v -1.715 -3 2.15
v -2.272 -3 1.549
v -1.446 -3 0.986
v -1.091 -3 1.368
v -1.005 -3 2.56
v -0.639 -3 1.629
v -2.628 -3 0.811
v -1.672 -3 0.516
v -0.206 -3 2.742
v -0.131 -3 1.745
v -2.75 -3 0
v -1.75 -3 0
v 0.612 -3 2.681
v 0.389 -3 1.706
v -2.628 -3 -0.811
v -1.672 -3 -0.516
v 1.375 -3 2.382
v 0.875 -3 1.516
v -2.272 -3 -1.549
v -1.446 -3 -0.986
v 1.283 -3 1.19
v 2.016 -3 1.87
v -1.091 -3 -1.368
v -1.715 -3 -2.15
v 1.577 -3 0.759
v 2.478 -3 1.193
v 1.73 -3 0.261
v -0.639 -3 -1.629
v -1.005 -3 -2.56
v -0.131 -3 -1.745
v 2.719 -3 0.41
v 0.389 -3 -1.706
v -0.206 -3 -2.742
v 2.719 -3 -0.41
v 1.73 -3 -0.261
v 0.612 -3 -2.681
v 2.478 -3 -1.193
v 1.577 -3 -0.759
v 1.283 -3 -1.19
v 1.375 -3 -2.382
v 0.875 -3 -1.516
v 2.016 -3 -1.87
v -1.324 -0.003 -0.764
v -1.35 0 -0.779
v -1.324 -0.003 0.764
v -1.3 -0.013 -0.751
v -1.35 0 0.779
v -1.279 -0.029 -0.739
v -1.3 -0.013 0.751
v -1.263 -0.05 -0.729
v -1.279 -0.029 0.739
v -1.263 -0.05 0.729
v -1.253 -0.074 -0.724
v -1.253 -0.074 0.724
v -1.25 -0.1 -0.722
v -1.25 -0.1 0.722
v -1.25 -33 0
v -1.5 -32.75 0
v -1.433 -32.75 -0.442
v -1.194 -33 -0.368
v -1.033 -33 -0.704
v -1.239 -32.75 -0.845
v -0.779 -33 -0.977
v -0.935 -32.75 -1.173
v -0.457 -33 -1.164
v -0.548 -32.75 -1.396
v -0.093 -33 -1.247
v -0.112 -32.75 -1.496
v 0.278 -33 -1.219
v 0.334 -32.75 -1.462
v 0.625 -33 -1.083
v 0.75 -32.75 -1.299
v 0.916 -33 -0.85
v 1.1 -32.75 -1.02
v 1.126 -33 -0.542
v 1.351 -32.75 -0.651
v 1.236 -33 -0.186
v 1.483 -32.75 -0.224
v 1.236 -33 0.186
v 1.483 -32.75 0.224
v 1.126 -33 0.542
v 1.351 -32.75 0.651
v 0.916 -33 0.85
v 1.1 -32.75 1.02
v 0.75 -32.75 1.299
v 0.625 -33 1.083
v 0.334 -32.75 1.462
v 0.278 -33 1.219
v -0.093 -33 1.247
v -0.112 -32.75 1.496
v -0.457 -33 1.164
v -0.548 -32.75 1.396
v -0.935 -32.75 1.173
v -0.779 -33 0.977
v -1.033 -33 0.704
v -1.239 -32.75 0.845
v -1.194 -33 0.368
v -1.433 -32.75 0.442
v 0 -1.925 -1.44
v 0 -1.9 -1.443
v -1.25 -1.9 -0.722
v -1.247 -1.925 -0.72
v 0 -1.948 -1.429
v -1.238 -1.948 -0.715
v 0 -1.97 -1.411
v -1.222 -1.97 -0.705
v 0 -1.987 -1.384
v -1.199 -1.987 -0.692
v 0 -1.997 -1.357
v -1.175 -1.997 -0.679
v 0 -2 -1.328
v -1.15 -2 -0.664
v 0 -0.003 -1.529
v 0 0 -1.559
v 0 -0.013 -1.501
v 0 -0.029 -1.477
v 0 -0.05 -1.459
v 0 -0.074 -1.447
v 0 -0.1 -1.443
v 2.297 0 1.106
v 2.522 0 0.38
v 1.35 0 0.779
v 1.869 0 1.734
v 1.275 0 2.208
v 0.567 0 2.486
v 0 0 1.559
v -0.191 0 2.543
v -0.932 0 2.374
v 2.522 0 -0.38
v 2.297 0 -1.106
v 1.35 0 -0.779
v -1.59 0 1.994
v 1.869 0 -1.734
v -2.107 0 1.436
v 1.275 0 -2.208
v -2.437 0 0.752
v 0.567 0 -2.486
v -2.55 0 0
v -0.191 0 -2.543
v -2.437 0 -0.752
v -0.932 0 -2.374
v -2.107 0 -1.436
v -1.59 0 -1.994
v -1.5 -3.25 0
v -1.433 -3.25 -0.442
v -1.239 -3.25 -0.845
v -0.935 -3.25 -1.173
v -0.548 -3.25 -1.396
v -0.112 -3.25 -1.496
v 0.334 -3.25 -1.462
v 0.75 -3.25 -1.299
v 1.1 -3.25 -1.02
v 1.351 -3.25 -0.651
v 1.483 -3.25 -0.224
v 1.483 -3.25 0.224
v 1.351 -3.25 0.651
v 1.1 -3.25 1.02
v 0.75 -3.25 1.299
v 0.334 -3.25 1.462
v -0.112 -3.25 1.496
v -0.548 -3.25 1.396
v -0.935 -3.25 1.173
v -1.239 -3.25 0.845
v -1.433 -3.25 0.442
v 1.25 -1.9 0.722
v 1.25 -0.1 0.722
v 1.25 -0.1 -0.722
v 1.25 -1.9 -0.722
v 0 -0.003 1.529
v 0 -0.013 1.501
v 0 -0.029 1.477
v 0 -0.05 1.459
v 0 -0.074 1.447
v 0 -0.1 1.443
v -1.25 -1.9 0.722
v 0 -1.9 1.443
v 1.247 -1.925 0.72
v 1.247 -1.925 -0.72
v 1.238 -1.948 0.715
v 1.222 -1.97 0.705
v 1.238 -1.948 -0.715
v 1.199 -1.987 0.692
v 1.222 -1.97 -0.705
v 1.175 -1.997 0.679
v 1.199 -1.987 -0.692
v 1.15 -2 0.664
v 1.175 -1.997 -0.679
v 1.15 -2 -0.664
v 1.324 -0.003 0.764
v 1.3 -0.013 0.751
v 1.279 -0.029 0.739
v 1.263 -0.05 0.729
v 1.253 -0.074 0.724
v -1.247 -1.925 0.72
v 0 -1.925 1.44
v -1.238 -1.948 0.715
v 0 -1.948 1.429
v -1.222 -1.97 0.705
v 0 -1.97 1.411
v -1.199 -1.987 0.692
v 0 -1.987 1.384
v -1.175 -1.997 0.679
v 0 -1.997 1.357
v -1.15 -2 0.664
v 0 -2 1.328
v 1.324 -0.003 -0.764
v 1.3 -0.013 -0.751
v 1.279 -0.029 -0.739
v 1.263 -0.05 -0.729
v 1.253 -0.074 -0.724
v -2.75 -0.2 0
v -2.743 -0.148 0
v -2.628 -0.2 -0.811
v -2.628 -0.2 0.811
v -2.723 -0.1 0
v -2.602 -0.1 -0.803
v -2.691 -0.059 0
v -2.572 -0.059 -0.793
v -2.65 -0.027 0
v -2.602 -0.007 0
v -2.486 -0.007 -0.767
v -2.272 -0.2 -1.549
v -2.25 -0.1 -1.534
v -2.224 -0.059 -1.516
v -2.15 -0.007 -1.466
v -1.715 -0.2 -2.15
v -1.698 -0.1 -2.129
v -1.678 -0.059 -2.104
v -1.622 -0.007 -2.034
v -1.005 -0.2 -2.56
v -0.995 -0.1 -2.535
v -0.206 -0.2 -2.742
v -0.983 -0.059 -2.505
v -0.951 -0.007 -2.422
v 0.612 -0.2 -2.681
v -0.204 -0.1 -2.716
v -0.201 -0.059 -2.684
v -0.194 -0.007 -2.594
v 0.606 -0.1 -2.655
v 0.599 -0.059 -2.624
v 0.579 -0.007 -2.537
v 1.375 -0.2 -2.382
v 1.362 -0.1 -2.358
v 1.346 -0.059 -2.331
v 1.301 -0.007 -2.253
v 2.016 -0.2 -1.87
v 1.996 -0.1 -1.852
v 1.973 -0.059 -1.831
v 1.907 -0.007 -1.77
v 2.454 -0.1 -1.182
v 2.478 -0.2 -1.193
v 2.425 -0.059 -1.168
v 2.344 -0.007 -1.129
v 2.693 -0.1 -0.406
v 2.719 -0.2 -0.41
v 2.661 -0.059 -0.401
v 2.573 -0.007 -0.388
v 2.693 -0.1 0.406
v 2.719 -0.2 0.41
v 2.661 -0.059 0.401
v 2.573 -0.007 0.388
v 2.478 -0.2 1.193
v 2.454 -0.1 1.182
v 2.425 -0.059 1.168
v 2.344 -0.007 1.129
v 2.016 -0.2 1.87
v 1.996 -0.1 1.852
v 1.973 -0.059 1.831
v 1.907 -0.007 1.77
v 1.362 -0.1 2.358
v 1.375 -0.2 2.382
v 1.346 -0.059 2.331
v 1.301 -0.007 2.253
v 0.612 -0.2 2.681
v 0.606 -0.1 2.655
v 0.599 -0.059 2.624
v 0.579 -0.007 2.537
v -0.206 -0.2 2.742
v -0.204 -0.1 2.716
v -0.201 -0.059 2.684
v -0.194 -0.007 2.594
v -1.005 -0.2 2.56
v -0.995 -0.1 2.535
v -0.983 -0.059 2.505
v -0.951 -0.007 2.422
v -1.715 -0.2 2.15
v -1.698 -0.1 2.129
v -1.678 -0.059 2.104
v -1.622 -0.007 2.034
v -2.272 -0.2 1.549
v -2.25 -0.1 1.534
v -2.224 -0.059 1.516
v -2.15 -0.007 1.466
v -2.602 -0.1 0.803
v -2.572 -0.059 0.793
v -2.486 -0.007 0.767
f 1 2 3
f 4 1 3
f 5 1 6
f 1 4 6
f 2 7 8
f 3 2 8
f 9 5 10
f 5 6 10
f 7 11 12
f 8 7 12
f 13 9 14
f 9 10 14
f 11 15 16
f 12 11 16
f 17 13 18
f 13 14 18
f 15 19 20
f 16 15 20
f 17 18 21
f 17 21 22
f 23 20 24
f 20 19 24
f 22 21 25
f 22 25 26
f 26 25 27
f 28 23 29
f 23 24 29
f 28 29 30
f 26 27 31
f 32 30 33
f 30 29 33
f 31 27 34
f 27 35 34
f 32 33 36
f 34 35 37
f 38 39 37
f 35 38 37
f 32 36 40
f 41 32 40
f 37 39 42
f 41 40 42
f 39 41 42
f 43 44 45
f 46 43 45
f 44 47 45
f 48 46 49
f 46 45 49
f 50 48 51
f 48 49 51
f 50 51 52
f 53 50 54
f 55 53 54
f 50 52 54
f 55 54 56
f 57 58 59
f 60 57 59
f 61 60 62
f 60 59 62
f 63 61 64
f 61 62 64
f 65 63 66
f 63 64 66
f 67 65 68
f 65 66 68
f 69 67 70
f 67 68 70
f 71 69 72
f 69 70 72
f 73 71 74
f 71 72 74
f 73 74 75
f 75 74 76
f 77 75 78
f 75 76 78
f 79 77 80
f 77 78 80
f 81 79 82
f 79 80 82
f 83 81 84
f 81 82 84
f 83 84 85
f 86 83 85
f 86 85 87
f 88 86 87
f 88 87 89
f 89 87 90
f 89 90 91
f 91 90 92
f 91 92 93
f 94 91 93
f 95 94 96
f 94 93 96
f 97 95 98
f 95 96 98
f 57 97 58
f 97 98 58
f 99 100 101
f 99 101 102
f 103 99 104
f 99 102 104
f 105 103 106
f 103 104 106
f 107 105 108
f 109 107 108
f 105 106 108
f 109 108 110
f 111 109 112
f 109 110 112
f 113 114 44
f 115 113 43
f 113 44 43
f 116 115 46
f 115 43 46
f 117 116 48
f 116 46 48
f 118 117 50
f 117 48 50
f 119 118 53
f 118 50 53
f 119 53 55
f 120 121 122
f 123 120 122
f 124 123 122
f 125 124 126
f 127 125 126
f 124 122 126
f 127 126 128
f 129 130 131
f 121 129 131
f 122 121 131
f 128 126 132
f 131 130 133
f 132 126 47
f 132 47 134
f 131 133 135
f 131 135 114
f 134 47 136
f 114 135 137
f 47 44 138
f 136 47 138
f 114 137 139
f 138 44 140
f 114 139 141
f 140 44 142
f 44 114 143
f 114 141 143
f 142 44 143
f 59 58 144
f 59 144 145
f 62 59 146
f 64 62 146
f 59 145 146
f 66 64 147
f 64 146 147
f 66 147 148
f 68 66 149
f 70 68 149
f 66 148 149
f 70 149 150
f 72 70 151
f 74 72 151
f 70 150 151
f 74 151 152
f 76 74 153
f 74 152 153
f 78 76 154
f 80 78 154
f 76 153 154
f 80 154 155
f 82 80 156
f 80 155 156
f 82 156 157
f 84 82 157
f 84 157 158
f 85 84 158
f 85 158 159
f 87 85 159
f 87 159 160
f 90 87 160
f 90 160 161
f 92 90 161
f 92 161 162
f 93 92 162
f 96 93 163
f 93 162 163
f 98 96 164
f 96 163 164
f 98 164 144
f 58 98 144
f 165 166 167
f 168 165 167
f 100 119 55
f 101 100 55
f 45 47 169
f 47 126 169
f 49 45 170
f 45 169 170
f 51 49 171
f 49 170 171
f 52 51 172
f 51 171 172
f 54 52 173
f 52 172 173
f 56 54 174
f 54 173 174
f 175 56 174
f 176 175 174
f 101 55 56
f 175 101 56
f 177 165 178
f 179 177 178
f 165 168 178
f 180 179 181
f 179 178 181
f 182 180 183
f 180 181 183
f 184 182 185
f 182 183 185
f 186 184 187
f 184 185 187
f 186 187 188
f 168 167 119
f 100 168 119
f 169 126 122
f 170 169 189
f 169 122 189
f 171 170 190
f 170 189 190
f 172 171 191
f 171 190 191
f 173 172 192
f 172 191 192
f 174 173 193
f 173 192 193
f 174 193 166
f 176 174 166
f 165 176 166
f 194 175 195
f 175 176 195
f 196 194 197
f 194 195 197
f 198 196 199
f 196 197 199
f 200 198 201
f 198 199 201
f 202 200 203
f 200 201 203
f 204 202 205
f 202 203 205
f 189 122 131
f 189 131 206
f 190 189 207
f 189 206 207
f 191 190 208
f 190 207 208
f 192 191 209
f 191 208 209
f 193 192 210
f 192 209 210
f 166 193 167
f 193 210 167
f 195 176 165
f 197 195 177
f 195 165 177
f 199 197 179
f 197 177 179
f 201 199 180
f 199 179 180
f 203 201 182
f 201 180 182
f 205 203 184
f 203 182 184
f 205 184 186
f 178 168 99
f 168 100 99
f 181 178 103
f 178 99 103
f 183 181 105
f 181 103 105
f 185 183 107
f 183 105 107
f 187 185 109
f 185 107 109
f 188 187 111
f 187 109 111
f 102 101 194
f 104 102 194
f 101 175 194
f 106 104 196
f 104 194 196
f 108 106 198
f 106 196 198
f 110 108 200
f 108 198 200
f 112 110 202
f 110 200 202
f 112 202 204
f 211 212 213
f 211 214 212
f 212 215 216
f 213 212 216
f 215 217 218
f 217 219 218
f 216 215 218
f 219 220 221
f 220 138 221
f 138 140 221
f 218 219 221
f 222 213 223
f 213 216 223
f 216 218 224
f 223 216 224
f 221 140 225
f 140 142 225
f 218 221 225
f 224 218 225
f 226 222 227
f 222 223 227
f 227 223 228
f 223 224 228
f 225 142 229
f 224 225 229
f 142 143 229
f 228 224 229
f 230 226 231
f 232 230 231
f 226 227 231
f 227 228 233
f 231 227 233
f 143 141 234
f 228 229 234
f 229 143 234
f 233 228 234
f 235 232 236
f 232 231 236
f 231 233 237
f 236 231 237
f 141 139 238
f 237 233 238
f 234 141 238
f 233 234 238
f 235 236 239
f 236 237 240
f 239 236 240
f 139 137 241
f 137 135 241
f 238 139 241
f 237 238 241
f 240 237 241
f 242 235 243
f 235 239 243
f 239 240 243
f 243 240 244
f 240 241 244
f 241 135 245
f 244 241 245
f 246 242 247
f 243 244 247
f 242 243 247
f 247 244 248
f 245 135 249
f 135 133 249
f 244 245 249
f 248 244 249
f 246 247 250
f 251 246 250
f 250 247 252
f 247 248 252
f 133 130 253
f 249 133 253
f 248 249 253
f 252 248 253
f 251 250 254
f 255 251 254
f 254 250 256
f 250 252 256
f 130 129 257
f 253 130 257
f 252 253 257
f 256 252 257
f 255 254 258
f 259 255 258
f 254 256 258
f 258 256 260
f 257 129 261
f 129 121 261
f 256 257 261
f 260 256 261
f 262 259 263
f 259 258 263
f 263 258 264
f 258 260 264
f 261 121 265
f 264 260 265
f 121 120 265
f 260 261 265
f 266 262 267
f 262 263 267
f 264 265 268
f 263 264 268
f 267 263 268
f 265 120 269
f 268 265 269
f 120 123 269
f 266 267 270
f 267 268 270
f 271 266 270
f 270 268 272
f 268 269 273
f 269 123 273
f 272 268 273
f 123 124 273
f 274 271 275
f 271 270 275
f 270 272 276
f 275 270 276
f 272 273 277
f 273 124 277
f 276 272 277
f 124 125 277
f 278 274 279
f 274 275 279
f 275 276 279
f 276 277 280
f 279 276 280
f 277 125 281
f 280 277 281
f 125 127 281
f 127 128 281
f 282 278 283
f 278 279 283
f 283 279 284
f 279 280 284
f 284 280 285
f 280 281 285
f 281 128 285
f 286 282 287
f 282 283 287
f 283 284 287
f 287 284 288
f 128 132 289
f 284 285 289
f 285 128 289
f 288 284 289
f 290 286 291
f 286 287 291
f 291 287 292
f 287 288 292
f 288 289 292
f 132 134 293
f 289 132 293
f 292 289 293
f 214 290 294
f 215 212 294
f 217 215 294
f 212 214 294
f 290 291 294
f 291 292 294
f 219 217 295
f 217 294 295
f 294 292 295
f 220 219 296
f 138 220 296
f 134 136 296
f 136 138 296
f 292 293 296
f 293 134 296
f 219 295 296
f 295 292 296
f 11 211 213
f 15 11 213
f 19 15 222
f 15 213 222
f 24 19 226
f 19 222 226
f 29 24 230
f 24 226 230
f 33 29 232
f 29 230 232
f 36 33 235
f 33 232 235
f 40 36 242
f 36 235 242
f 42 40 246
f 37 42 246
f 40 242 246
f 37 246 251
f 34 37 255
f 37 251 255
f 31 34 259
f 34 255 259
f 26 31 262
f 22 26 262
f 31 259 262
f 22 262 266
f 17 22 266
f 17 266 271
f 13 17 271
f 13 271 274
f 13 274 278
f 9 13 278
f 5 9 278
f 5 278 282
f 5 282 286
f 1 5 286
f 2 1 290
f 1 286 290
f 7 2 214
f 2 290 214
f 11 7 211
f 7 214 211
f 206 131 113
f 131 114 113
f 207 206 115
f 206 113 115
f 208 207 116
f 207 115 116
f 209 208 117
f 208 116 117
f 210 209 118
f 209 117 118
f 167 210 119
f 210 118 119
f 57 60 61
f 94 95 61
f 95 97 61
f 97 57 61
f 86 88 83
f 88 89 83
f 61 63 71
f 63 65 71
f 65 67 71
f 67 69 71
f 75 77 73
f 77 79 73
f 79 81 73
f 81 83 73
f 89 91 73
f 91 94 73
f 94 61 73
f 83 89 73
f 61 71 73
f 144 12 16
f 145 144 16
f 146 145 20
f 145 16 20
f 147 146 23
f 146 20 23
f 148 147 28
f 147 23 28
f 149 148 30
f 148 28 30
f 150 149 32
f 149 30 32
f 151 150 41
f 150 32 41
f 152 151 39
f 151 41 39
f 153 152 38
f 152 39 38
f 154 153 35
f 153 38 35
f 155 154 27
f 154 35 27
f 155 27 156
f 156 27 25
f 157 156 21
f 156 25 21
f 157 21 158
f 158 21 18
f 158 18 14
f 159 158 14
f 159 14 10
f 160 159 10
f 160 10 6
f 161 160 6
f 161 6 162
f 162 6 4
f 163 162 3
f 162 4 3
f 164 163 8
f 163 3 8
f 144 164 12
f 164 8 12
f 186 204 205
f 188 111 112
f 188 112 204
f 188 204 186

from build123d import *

# Parameters (mm, degrees)
CHAMFER1_SIZE      = 0.25
FILLET1_R          = 0.2
CUT_EXTRUDE1_DEPTH = 2
FILLET2_R          = 0.1


with BuildPart() as part:
    # Sketch1 → Revolve1 (revolve)
    with BuildSketch(Plane.XY):
        Polygon((0, -33), (-1.5, -33), (-1.5, -3), (-2.75, -3), (-2.75, 0), (0, 0), align=None)
    revolve(axis=Axis((0, 0, 0), (0, -1, 0)))

    # Chamfer1
    chamfer1_edges = [part.edges().sort_by_distance(p)[0] for p in [
        (1.5, -3, 0),
        (1.5, -33, 0),
    ]]
    chamfer(chamfer1_edges, length=CHAMFER1_SIZE)

    # Fillet1
    fillet1_edges = [part.edges().sort_by_distance(p)[0] for p in [
        (2.75, 0, 0),
    ]]
    fillet(fillet1_edges, radius=FILLET1_R)

    # Sketch2 → Cut-Extrude1 (cut)
    with BuildSketch(Plane(origin=(0, 0, 0), x_dir=(1, 0, 0), z_dir=(0, 1, 0))):
        Polygon((0, 1.443375673), (-1.25, 0.721687836), (-1.25, -0.721687836), (0, -1.443375673), (1.25, -0.721687836), (1.25, 0.721687836), align=None)
    extrude(amount=-CUT_EXTRUDE1_DEPTH, mode=Mode.SUBTRACT)

    # Fillet2
    fillet2_edges = [part.edges().sort_by_distance(p)[0] for p in [
        (0.625, -2, -1.082531755),
        (1.25, -2, 0),
        (0.625, -2, 1.082531755),
        (-0.625, -2, 1.082531755),
        (-1.25, -2, 0),
        (-0.625, -2, -1.082531755),
        (0.625, 0, -1.082531755),
        (-0.625, 0, -1.082531755),
        (-1.25, 0, 0),
        (-0.625, 0, 1.082531755),
        (0.625, 0, 1.082531755),
        (1.25, 0, 0),
    ]]
    fillet(fillet2_edges, radius=FILLET2_R)


solid = part.part
